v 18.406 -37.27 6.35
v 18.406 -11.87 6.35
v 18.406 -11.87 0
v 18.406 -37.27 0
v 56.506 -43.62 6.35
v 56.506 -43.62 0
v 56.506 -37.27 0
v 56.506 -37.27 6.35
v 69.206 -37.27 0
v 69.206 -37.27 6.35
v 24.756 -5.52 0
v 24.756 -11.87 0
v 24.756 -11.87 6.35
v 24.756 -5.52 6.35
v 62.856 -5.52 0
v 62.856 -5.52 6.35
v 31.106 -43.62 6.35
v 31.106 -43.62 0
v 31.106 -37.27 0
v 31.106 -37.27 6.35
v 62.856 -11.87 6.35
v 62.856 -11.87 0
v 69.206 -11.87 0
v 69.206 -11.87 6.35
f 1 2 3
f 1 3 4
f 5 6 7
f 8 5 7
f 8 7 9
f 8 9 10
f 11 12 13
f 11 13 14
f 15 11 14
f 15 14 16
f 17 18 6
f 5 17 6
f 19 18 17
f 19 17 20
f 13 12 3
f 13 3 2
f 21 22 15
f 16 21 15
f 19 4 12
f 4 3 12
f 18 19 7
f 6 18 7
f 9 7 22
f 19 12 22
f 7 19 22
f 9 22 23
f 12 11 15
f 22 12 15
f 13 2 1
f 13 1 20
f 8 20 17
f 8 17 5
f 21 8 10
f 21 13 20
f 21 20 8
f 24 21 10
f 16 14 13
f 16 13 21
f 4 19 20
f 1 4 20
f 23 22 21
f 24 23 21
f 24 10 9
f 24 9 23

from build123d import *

# Parameters (mm, degrees)
F0_W     = 38.1
F0_H     = 38.1
F1_DEPTH = 6.35
F2_W     = 25.4
F2_H     = 6.35
F4_DEPTH = 6.35
F3_W     = 25.4
F3_H     = 6.35
F5_DEPTH = 6.35
F6_DEPTH = 6.35
F7_DEPTH = 6.35


with BuildPart() as f1:
    # F0 (on Top) → F1 (new body)
    with BuildSketch(Plane.XY):
        with Locations((43.8062495112, -24.5695395887)):
            Rectangle(F0_W, F0_H)
    extrude(amount=F1_DEPTH)

    # F2 (on face) → F4 (join)
    with BuildSketch(Plane.YZ.offset(62.8562495112)):
        with Locations((-24.5695395887, 3.175)):
            Rectangle(F2_W, F2_H)
    extrude(amount=F4_DEPTH)

    # F3 (on face) → F5 (join)
    with BuildSketch(Plane(origin=(24.7562495112, 0, 0), x_dir=(0, -1, 0), z_dir=(-1, 0, 0))):
        with Locations((24.5695395887, 3.175)):
            Rectangle(F3_W, F3_H)
    extrude(amount=F5_DEPTH)

    # F6 (cut): a face of the model
    f6_faces = [f1.faces().sort_by_distance(p)[0] for p in [
        (62.8562495112, -40.4445395887, 3.175),
    ]]
    extrude(f6_faces, amount=-F6_DEPTH, mode=Mode.SUBTRACT)

    # F7 (cut): a face of the model
    f7_faces = [f1.faces().sort_by_distance(p)[0] for p in [
        (24.7562495112, -40.4445395887, 3.175),
    ]]
    extrude(f7_faces, amount=-F7_DEPTH, mode=Mode.SUBTRACT)


solid = f1.part
